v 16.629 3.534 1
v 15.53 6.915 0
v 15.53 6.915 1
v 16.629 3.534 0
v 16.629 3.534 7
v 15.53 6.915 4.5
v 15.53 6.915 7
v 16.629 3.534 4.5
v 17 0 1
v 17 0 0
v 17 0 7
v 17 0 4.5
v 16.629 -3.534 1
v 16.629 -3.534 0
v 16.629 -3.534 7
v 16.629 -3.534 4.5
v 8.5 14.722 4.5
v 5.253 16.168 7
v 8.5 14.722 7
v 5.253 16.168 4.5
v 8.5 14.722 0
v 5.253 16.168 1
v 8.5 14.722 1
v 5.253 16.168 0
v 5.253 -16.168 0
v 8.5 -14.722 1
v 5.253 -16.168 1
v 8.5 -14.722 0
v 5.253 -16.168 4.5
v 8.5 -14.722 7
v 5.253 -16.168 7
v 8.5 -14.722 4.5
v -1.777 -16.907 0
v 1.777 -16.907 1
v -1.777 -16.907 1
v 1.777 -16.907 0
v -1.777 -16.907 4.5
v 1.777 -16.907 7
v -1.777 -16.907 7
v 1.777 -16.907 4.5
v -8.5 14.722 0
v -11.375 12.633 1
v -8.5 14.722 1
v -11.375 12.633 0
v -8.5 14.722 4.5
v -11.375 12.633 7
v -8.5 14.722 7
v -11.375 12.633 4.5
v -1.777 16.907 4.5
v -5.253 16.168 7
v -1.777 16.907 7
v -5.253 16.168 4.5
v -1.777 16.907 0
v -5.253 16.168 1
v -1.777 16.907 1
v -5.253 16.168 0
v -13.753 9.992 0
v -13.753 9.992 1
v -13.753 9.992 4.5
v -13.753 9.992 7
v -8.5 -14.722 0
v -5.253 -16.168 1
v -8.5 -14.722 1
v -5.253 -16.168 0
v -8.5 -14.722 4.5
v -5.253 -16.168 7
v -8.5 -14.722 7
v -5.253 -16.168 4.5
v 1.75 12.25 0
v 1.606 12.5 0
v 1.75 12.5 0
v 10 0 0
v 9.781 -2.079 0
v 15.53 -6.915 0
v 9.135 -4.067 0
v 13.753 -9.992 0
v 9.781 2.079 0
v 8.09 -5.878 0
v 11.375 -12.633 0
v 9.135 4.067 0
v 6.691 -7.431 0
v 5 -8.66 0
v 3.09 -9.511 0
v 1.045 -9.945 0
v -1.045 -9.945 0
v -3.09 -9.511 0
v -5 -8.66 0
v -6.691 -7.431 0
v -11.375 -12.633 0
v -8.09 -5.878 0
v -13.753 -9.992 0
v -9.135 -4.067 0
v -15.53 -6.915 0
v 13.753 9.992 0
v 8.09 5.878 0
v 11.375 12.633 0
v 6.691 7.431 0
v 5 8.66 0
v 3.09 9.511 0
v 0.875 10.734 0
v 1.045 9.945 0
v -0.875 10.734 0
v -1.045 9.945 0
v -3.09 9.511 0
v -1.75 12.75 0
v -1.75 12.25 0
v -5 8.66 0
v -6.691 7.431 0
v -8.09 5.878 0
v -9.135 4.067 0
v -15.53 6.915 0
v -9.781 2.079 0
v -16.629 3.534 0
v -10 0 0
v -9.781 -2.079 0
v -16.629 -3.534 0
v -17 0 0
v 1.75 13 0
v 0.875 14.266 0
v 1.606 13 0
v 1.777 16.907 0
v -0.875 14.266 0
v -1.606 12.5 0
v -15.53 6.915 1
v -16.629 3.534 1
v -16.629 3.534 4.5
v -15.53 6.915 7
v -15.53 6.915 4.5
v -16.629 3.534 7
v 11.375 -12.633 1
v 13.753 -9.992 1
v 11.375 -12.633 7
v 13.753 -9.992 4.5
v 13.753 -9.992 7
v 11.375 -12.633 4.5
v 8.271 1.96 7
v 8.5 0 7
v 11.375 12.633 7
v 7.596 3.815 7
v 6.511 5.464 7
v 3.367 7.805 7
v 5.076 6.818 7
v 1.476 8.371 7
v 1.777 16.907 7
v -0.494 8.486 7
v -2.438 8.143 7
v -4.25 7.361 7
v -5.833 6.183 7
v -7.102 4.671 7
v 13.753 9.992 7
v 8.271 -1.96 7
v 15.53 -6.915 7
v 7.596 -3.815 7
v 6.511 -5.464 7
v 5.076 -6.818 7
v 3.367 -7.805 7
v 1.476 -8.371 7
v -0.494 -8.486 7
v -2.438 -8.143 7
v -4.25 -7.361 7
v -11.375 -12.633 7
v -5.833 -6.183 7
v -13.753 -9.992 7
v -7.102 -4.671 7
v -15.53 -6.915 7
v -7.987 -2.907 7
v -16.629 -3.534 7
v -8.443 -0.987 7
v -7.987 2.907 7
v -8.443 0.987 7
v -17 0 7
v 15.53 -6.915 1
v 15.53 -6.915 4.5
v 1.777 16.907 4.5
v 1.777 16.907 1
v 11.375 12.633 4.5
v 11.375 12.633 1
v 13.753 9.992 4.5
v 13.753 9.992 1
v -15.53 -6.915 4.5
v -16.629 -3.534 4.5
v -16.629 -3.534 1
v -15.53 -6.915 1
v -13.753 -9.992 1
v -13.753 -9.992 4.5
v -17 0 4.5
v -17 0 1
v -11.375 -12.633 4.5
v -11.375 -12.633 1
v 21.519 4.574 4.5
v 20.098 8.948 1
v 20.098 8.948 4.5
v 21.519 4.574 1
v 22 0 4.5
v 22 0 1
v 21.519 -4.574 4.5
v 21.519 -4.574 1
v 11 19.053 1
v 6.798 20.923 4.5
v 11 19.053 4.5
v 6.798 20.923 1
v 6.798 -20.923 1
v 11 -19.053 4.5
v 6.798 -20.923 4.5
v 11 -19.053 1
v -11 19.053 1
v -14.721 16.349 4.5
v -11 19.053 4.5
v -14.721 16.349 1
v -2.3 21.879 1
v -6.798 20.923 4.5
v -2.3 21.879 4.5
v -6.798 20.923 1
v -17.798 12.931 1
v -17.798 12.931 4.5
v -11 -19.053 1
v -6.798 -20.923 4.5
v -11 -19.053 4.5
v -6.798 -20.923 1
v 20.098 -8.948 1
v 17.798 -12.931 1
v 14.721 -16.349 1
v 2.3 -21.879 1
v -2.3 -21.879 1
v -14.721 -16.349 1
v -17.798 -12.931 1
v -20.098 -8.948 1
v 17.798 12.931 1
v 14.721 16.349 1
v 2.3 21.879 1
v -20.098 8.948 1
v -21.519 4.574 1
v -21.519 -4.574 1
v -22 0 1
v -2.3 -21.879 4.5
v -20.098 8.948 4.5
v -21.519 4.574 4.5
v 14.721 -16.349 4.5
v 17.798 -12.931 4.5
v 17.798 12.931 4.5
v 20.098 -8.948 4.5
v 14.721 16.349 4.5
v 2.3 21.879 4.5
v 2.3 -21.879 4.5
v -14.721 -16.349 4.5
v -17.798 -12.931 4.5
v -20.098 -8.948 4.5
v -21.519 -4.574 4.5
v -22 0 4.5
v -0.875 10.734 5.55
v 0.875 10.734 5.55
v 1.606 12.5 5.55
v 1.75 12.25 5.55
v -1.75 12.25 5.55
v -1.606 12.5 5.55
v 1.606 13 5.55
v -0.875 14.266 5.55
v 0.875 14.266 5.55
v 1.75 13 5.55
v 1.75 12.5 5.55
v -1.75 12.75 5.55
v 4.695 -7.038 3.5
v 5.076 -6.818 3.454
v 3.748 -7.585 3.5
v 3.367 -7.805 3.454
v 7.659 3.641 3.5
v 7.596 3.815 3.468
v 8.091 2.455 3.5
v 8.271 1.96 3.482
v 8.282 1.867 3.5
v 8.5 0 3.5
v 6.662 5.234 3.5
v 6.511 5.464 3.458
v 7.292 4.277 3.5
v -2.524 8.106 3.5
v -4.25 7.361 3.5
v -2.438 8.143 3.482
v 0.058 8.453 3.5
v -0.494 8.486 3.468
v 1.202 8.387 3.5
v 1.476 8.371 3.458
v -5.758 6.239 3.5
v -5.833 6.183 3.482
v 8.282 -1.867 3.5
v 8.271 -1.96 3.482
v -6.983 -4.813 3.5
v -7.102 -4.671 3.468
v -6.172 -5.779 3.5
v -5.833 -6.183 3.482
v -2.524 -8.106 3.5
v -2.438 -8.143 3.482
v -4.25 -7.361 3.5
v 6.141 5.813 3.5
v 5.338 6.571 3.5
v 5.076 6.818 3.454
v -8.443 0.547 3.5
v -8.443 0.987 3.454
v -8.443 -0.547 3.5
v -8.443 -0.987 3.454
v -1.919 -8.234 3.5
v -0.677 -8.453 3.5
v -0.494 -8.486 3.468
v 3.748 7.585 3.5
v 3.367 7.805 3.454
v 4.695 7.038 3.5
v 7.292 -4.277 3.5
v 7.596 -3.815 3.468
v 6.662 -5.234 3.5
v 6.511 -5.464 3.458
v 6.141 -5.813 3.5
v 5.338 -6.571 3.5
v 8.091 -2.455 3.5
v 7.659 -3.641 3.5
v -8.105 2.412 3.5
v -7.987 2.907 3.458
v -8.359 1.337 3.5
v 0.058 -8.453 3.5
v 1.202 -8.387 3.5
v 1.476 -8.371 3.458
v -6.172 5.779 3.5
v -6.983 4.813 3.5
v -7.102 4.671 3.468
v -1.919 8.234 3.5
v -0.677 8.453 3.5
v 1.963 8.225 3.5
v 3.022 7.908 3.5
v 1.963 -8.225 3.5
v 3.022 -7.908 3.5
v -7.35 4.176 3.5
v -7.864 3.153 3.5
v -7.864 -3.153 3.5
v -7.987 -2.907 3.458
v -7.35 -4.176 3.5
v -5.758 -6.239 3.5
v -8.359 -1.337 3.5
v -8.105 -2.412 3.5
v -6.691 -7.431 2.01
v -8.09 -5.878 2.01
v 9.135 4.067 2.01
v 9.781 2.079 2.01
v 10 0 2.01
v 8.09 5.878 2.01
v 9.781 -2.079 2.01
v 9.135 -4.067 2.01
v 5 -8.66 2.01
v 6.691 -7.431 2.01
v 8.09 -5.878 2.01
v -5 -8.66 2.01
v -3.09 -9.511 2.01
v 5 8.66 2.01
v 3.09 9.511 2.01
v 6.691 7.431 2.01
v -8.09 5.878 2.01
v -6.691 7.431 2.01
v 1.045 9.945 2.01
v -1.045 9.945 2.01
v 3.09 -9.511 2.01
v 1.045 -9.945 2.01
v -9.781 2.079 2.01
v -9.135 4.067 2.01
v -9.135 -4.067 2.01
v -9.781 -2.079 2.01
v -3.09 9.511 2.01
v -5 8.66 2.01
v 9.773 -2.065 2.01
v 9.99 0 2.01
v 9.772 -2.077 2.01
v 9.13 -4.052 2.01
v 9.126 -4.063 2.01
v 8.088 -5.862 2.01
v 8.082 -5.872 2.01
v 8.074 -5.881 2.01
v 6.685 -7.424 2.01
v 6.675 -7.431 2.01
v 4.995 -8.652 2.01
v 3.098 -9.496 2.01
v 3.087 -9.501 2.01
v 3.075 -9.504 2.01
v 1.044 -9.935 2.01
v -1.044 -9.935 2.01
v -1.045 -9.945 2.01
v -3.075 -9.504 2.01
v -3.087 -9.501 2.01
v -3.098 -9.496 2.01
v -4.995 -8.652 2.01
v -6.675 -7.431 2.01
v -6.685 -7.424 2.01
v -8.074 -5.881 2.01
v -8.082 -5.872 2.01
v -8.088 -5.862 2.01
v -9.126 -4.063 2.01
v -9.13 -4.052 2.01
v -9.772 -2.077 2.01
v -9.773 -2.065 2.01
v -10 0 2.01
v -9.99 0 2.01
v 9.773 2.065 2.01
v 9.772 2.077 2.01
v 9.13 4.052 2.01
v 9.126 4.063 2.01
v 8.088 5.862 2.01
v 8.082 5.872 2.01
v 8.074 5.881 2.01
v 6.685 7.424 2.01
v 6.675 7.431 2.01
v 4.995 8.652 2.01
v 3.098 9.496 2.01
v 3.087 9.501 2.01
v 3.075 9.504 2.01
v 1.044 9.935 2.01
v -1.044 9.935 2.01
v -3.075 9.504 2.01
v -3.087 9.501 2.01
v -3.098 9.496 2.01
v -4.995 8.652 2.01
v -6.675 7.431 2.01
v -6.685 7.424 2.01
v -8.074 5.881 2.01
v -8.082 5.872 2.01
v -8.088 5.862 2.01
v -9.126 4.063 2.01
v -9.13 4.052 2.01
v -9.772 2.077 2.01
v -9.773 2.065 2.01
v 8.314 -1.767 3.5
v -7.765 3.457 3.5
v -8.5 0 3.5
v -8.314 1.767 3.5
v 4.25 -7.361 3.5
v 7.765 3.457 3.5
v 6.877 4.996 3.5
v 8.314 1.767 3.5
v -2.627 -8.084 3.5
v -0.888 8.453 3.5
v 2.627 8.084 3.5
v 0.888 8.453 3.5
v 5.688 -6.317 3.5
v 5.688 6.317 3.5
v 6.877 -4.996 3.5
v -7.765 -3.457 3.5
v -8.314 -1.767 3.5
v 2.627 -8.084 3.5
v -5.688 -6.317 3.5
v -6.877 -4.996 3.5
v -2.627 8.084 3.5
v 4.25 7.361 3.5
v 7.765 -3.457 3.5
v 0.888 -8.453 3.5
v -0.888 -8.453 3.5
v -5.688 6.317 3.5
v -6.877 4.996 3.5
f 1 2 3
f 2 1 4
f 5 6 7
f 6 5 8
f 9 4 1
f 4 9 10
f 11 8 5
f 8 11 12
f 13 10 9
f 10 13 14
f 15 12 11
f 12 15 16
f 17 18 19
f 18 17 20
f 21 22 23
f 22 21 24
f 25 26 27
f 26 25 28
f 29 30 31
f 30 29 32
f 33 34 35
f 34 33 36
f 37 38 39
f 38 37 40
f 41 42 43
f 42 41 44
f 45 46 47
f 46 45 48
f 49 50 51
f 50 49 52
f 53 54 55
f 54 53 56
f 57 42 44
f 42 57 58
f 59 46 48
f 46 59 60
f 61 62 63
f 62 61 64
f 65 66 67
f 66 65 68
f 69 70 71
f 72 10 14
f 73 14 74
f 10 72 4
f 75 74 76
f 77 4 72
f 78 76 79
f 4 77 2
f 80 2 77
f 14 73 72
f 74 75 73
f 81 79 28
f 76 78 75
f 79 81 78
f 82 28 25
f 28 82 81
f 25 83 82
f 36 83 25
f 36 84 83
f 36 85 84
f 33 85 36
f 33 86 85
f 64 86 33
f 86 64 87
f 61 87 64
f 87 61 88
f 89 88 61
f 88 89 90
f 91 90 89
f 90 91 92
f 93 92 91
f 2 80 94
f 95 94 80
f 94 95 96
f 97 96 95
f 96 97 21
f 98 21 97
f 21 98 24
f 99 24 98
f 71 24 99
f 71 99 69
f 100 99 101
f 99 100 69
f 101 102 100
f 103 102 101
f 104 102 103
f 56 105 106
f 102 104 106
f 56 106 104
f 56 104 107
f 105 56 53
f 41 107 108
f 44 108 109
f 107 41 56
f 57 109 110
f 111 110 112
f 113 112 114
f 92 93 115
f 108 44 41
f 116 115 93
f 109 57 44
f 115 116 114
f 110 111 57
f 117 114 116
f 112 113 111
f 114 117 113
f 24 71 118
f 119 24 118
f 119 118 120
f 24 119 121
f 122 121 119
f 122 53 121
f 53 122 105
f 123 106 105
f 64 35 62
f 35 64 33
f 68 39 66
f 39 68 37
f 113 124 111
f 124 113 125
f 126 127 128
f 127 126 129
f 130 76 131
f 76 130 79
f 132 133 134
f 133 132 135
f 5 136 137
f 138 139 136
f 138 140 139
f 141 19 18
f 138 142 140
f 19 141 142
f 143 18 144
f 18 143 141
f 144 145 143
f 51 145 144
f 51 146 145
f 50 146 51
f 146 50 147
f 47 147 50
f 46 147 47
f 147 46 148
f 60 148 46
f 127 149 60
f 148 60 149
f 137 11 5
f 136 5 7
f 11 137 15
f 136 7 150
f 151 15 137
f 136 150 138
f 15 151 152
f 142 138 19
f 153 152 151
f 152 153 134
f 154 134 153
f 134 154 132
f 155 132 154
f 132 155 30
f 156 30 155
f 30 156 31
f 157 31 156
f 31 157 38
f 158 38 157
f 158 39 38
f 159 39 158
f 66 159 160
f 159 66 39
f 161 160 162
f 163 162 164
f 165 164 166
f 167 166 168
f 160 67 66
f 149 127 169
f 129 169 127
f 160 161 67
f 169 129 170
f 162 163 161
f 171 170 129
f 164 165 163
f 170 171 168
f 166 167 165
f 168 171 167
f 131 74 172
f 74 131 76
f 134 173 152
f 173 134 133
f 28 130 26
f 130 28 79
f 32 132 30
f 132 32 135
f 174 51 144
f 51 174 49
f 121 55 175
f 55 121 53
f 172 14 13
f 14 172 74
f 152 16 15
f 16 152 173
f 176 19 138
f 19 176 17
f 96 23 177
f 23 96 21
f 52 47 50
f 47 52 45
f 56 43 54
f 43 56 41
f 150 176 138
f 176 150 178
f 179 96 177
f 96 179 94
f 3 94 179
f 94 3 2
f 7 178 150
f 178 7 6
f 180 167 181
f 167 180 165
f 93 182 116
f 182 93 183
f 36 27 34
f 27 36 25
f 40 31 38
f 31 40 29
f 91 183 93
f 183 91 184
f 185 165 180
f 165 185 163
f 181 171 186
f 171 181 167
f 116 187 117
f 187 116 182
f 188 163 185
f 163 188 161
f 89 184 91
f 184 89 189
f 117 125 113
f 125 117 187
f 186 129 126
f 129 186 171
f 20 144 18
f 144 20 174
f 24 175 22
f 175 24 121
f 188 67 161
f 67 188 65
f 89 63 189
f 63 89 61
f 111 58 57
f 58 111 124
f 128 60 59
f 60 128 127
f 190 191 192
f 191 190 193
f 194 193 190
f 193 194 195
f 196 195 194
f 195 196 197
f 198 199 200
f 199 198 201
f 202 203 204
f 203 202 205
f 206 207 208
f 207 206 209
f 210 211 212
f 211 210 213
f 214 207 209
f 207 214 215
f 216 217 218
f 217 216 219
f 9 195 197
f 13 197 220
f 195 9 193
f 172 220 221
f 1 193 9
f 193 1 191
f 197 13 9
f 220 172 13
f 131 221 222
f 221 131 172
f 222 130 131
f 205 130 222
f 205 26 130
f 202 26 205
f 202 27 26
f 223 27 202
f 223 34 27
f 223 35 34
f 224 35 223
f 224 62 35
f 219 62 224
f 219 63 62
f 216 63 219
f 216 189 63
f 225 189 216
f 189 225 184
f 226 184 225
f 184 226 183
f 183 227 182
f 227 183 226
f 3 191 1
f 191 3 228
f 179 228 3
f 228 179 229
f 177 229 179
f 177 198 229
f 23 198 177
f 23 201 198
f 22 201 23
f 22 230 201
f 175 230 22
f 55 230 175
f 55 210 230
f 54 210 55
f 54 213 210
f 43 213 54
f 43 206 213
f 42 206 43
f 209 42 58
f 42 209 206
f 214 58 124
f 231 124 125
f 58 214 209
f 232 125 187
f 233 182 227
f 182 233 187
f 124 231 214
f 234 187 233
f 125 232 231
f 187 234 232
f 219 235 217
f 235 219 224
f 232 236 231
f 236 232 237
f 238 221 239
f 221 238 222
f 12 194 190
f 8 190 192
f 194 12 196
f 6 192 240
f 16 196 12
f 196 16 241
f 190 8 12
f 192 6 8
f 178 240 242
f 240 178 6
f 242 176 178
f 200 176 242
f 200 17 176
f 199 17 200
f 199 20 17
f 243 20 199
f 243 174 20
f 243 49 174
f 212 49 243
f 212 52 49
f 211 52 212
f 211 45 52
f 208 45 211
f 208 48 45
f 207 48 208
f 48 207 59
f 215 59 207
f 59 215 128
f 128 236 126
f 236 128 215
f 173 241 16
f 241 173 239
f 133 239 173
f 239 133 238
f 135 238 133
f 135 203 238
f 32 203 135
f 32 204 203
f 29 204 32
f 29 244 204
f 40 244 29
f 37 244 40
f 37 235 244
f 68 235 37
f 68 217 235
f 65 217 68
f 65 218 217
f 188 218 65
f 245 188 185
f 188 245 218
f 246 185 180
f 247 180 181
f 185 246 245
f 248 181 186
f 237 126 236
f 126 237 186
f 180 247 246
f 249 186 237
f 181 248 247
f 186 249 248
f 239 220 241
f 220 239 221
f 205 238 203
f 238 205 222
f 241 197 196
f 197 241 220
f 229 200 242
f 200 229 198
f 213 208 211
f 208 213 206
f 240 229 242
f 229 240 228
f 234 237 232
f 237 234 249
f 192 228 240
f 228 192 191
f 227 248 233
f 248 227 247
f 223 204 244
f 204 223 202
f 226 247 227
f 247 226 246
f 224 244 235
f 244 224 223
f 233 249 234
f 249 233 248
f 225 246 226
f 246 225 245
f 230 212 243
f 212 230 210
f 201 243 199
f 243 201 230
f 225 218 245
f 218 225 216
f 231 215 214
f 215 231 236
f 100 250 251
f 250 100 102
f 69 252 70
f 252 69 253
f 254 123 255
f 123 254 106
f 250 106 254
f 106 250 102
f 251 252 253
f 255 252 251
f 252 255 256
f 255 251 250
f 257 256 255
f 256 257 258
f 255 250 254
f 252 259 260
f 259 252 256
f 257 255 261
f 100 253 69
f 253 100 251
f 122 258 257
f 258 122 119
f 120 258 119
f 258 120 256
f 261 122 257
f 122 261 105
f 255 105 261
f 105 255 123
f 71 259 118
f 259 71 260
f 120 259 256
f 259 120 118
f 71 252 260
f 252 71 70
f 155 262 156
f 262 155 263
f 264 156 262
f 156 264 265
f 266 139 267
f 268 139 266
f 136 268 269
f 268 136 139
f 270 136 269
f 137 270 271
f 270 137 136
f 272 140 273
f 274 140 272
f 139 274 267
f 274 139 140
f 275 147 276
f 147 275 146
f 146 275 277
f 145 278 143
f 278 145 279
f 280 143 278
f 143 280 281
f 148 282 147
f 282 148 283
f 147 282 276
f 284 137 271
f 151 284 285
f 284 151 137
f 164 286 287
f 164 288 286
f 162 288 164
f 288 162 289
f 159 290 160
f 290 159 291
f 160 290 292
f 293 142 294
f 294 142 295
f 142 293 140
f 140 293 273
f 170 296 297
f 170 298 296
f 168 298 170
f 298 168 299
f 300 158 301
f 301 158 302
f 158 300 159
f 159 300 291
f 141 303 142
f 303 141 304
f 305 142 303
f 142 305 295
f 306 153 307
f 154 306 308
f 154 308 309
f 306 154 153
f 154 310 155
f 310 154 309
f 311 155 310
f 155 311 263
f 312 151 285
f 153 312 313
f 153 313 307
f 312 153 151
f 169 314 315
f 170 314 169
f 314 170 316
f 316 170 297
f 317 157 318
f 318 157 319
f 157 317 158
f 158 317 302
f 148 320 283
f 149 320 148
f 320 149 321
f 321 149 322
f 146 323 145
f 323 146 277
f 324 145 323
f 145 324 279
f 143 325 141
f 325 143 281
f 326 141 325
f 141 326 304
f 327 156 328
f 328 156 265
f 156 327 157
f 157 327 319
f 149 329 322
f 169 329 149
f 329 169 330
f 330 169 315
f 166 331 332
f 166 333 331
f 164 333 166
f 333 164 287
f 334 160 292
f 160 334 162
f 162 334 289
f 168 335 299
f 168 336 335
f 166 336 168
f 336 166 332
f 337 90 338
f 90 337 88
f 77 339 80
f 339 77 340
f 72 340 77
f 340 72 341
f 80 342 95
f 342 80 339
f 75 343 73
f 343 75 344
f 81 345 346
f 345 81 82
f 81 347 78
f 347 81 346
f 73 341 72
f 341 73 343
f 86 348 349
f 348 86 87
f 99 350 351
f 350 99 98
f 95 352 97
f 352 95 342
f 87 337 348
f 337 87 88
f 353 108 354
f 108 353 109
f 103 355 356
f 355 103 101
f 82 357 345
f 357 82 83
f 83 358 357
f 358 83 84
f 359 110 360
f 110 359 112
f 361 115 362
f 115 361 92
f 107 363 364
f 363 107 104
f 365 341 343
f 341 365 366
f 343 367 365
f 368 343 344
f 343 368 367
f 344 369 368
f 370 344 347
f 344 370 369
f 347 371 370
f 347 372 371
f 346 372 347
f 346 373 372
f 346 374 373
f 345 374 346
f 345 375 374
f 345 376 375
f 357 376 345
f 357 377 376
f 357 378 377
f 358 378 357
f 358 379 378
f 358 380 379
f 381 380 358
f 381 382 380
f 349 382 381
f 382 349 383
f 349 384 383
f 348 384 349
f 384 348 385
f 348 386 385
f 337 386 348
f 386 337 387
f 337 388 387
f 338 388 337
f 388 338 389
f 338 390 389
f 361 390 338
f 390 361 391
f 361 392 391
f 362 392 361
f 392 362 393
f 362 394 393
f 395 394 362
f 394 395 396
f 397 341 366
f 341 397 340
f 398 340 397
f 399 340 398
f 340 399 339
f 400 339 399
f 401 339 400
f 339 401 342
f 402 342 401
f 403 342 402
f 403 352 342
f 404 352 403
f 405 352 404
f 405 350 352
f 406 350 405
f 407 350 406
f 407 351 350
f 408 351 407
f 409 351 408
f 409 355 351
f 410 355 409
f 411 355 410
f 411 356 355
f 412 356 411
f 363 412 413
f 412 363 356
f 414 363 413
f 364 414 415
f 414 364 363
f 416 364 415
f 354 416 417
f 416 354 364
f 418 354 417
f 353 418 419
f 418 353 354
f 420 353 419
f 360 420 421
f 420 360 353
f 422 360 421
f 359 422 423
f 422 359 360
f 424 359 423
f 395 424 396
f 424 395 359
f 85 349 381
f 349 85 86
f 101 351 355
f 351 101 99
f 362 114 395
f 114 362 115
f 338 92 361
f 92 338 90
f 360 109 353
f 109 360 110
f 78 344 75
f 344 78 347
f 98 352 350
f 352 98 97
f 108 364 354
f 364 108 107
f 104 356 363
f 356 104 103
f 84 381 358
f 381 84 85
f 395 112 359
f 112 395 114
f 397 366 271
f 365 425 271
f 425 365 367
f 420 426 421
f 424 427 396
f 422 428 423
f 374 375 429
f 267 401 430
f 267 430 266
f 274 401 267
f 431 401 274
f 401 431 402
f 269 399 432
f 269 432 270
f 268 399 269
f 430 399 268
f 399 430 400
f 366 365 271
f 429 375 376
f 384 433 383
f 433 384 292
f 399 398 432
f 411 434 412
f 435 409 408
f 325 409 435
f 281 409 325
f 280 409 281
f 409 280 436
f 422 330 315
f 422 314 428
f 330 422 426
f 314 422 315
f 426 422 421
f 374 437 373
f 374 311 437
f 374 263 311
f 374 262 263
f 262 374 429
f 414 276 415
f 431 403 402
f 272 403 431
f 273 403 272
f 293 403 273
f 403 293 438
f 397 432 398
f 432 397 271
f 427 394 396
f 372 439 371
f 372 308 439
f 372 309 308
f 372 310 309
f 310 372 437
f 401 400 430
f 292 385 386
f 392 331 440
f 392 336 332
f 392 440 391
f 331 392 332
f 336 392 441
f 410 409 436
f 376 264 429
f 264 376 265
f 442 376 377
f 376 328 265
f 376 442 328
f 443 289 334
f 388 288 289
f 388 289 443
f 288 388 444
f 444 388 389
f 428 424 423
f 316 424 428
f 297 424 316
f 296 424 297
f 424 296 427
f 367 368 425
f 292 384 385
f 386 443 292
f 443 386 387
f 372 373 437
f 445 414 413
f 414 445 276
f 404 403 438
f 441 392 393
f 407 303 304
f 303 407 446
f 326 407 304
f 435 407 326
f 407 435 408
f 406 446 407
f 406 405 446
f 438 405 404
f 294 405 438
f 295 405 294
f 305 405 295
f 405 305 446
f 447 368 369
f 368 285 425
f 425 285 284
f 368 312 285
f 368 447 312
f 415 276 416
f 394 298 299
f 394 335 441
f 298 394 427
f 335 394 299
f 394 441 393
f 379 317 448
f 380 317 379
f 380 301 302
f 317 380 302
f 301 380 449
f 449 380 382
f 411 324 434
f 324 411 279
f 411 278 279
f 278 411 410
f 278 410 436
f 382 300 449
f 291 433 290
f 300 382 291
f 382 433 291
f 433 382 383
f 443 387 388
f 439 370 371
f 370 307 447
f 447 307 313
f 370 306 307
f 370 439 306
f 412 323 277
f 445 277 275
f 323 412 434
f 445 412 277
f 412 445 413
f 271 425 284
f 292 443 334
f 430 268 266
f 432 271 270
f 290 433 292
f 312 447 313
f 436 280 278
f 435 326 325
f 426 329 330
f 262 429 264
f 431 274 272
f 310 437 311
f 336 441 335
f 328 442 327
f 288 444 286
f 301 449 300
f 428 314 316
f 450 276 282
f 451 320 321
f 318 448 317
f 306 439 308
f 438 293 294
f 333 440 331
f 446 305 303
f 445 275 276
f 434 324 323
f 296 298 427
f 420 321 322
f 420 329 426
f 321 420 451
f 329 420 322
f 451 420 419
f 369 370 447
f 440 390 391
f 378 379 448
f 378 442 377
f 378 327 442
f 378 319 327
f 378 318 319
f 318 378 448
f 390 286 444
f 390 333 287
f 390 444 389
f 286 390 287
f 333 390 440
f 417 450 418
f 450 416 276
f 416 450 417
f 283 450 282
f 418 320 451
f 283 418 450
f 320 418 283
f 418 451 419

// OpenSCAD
difference() {
	union() {
		// Big cylinder for placement inside the machine.
		cylinder(h = 7, r = 17);

		// Outer cylinder; any sewing information would go here.
		translate([0, 0, 1]) cylinder(h = 3.5, r = 22);
	}

	// Subtract the inner hole. Be very generous.
	translate([0, 0, 4])
		cylinder(h = 10, r = 8.5, center=true);

	// Subtract the lower cone.
	cylinder(h = 2.01, r = 10);

	// Subtract the diagonal layer the disk rests on.
	translate([0, 0, 2])
		cylinder(h = 1.5, r1 = 10, r2 = 8.5);

	// Transport hole
	union() {
		translate([0, 12.25, -0.05])
			cylinder(h = 5.6, r=1.75);
		translate([0, 12.75, -0.05])
			cylinder(h = 5.6, r=1.75);
		translate([0, 12.5, -0.05])
			cube(size = [1.75, 0.5, 5.6]);
	}
}
